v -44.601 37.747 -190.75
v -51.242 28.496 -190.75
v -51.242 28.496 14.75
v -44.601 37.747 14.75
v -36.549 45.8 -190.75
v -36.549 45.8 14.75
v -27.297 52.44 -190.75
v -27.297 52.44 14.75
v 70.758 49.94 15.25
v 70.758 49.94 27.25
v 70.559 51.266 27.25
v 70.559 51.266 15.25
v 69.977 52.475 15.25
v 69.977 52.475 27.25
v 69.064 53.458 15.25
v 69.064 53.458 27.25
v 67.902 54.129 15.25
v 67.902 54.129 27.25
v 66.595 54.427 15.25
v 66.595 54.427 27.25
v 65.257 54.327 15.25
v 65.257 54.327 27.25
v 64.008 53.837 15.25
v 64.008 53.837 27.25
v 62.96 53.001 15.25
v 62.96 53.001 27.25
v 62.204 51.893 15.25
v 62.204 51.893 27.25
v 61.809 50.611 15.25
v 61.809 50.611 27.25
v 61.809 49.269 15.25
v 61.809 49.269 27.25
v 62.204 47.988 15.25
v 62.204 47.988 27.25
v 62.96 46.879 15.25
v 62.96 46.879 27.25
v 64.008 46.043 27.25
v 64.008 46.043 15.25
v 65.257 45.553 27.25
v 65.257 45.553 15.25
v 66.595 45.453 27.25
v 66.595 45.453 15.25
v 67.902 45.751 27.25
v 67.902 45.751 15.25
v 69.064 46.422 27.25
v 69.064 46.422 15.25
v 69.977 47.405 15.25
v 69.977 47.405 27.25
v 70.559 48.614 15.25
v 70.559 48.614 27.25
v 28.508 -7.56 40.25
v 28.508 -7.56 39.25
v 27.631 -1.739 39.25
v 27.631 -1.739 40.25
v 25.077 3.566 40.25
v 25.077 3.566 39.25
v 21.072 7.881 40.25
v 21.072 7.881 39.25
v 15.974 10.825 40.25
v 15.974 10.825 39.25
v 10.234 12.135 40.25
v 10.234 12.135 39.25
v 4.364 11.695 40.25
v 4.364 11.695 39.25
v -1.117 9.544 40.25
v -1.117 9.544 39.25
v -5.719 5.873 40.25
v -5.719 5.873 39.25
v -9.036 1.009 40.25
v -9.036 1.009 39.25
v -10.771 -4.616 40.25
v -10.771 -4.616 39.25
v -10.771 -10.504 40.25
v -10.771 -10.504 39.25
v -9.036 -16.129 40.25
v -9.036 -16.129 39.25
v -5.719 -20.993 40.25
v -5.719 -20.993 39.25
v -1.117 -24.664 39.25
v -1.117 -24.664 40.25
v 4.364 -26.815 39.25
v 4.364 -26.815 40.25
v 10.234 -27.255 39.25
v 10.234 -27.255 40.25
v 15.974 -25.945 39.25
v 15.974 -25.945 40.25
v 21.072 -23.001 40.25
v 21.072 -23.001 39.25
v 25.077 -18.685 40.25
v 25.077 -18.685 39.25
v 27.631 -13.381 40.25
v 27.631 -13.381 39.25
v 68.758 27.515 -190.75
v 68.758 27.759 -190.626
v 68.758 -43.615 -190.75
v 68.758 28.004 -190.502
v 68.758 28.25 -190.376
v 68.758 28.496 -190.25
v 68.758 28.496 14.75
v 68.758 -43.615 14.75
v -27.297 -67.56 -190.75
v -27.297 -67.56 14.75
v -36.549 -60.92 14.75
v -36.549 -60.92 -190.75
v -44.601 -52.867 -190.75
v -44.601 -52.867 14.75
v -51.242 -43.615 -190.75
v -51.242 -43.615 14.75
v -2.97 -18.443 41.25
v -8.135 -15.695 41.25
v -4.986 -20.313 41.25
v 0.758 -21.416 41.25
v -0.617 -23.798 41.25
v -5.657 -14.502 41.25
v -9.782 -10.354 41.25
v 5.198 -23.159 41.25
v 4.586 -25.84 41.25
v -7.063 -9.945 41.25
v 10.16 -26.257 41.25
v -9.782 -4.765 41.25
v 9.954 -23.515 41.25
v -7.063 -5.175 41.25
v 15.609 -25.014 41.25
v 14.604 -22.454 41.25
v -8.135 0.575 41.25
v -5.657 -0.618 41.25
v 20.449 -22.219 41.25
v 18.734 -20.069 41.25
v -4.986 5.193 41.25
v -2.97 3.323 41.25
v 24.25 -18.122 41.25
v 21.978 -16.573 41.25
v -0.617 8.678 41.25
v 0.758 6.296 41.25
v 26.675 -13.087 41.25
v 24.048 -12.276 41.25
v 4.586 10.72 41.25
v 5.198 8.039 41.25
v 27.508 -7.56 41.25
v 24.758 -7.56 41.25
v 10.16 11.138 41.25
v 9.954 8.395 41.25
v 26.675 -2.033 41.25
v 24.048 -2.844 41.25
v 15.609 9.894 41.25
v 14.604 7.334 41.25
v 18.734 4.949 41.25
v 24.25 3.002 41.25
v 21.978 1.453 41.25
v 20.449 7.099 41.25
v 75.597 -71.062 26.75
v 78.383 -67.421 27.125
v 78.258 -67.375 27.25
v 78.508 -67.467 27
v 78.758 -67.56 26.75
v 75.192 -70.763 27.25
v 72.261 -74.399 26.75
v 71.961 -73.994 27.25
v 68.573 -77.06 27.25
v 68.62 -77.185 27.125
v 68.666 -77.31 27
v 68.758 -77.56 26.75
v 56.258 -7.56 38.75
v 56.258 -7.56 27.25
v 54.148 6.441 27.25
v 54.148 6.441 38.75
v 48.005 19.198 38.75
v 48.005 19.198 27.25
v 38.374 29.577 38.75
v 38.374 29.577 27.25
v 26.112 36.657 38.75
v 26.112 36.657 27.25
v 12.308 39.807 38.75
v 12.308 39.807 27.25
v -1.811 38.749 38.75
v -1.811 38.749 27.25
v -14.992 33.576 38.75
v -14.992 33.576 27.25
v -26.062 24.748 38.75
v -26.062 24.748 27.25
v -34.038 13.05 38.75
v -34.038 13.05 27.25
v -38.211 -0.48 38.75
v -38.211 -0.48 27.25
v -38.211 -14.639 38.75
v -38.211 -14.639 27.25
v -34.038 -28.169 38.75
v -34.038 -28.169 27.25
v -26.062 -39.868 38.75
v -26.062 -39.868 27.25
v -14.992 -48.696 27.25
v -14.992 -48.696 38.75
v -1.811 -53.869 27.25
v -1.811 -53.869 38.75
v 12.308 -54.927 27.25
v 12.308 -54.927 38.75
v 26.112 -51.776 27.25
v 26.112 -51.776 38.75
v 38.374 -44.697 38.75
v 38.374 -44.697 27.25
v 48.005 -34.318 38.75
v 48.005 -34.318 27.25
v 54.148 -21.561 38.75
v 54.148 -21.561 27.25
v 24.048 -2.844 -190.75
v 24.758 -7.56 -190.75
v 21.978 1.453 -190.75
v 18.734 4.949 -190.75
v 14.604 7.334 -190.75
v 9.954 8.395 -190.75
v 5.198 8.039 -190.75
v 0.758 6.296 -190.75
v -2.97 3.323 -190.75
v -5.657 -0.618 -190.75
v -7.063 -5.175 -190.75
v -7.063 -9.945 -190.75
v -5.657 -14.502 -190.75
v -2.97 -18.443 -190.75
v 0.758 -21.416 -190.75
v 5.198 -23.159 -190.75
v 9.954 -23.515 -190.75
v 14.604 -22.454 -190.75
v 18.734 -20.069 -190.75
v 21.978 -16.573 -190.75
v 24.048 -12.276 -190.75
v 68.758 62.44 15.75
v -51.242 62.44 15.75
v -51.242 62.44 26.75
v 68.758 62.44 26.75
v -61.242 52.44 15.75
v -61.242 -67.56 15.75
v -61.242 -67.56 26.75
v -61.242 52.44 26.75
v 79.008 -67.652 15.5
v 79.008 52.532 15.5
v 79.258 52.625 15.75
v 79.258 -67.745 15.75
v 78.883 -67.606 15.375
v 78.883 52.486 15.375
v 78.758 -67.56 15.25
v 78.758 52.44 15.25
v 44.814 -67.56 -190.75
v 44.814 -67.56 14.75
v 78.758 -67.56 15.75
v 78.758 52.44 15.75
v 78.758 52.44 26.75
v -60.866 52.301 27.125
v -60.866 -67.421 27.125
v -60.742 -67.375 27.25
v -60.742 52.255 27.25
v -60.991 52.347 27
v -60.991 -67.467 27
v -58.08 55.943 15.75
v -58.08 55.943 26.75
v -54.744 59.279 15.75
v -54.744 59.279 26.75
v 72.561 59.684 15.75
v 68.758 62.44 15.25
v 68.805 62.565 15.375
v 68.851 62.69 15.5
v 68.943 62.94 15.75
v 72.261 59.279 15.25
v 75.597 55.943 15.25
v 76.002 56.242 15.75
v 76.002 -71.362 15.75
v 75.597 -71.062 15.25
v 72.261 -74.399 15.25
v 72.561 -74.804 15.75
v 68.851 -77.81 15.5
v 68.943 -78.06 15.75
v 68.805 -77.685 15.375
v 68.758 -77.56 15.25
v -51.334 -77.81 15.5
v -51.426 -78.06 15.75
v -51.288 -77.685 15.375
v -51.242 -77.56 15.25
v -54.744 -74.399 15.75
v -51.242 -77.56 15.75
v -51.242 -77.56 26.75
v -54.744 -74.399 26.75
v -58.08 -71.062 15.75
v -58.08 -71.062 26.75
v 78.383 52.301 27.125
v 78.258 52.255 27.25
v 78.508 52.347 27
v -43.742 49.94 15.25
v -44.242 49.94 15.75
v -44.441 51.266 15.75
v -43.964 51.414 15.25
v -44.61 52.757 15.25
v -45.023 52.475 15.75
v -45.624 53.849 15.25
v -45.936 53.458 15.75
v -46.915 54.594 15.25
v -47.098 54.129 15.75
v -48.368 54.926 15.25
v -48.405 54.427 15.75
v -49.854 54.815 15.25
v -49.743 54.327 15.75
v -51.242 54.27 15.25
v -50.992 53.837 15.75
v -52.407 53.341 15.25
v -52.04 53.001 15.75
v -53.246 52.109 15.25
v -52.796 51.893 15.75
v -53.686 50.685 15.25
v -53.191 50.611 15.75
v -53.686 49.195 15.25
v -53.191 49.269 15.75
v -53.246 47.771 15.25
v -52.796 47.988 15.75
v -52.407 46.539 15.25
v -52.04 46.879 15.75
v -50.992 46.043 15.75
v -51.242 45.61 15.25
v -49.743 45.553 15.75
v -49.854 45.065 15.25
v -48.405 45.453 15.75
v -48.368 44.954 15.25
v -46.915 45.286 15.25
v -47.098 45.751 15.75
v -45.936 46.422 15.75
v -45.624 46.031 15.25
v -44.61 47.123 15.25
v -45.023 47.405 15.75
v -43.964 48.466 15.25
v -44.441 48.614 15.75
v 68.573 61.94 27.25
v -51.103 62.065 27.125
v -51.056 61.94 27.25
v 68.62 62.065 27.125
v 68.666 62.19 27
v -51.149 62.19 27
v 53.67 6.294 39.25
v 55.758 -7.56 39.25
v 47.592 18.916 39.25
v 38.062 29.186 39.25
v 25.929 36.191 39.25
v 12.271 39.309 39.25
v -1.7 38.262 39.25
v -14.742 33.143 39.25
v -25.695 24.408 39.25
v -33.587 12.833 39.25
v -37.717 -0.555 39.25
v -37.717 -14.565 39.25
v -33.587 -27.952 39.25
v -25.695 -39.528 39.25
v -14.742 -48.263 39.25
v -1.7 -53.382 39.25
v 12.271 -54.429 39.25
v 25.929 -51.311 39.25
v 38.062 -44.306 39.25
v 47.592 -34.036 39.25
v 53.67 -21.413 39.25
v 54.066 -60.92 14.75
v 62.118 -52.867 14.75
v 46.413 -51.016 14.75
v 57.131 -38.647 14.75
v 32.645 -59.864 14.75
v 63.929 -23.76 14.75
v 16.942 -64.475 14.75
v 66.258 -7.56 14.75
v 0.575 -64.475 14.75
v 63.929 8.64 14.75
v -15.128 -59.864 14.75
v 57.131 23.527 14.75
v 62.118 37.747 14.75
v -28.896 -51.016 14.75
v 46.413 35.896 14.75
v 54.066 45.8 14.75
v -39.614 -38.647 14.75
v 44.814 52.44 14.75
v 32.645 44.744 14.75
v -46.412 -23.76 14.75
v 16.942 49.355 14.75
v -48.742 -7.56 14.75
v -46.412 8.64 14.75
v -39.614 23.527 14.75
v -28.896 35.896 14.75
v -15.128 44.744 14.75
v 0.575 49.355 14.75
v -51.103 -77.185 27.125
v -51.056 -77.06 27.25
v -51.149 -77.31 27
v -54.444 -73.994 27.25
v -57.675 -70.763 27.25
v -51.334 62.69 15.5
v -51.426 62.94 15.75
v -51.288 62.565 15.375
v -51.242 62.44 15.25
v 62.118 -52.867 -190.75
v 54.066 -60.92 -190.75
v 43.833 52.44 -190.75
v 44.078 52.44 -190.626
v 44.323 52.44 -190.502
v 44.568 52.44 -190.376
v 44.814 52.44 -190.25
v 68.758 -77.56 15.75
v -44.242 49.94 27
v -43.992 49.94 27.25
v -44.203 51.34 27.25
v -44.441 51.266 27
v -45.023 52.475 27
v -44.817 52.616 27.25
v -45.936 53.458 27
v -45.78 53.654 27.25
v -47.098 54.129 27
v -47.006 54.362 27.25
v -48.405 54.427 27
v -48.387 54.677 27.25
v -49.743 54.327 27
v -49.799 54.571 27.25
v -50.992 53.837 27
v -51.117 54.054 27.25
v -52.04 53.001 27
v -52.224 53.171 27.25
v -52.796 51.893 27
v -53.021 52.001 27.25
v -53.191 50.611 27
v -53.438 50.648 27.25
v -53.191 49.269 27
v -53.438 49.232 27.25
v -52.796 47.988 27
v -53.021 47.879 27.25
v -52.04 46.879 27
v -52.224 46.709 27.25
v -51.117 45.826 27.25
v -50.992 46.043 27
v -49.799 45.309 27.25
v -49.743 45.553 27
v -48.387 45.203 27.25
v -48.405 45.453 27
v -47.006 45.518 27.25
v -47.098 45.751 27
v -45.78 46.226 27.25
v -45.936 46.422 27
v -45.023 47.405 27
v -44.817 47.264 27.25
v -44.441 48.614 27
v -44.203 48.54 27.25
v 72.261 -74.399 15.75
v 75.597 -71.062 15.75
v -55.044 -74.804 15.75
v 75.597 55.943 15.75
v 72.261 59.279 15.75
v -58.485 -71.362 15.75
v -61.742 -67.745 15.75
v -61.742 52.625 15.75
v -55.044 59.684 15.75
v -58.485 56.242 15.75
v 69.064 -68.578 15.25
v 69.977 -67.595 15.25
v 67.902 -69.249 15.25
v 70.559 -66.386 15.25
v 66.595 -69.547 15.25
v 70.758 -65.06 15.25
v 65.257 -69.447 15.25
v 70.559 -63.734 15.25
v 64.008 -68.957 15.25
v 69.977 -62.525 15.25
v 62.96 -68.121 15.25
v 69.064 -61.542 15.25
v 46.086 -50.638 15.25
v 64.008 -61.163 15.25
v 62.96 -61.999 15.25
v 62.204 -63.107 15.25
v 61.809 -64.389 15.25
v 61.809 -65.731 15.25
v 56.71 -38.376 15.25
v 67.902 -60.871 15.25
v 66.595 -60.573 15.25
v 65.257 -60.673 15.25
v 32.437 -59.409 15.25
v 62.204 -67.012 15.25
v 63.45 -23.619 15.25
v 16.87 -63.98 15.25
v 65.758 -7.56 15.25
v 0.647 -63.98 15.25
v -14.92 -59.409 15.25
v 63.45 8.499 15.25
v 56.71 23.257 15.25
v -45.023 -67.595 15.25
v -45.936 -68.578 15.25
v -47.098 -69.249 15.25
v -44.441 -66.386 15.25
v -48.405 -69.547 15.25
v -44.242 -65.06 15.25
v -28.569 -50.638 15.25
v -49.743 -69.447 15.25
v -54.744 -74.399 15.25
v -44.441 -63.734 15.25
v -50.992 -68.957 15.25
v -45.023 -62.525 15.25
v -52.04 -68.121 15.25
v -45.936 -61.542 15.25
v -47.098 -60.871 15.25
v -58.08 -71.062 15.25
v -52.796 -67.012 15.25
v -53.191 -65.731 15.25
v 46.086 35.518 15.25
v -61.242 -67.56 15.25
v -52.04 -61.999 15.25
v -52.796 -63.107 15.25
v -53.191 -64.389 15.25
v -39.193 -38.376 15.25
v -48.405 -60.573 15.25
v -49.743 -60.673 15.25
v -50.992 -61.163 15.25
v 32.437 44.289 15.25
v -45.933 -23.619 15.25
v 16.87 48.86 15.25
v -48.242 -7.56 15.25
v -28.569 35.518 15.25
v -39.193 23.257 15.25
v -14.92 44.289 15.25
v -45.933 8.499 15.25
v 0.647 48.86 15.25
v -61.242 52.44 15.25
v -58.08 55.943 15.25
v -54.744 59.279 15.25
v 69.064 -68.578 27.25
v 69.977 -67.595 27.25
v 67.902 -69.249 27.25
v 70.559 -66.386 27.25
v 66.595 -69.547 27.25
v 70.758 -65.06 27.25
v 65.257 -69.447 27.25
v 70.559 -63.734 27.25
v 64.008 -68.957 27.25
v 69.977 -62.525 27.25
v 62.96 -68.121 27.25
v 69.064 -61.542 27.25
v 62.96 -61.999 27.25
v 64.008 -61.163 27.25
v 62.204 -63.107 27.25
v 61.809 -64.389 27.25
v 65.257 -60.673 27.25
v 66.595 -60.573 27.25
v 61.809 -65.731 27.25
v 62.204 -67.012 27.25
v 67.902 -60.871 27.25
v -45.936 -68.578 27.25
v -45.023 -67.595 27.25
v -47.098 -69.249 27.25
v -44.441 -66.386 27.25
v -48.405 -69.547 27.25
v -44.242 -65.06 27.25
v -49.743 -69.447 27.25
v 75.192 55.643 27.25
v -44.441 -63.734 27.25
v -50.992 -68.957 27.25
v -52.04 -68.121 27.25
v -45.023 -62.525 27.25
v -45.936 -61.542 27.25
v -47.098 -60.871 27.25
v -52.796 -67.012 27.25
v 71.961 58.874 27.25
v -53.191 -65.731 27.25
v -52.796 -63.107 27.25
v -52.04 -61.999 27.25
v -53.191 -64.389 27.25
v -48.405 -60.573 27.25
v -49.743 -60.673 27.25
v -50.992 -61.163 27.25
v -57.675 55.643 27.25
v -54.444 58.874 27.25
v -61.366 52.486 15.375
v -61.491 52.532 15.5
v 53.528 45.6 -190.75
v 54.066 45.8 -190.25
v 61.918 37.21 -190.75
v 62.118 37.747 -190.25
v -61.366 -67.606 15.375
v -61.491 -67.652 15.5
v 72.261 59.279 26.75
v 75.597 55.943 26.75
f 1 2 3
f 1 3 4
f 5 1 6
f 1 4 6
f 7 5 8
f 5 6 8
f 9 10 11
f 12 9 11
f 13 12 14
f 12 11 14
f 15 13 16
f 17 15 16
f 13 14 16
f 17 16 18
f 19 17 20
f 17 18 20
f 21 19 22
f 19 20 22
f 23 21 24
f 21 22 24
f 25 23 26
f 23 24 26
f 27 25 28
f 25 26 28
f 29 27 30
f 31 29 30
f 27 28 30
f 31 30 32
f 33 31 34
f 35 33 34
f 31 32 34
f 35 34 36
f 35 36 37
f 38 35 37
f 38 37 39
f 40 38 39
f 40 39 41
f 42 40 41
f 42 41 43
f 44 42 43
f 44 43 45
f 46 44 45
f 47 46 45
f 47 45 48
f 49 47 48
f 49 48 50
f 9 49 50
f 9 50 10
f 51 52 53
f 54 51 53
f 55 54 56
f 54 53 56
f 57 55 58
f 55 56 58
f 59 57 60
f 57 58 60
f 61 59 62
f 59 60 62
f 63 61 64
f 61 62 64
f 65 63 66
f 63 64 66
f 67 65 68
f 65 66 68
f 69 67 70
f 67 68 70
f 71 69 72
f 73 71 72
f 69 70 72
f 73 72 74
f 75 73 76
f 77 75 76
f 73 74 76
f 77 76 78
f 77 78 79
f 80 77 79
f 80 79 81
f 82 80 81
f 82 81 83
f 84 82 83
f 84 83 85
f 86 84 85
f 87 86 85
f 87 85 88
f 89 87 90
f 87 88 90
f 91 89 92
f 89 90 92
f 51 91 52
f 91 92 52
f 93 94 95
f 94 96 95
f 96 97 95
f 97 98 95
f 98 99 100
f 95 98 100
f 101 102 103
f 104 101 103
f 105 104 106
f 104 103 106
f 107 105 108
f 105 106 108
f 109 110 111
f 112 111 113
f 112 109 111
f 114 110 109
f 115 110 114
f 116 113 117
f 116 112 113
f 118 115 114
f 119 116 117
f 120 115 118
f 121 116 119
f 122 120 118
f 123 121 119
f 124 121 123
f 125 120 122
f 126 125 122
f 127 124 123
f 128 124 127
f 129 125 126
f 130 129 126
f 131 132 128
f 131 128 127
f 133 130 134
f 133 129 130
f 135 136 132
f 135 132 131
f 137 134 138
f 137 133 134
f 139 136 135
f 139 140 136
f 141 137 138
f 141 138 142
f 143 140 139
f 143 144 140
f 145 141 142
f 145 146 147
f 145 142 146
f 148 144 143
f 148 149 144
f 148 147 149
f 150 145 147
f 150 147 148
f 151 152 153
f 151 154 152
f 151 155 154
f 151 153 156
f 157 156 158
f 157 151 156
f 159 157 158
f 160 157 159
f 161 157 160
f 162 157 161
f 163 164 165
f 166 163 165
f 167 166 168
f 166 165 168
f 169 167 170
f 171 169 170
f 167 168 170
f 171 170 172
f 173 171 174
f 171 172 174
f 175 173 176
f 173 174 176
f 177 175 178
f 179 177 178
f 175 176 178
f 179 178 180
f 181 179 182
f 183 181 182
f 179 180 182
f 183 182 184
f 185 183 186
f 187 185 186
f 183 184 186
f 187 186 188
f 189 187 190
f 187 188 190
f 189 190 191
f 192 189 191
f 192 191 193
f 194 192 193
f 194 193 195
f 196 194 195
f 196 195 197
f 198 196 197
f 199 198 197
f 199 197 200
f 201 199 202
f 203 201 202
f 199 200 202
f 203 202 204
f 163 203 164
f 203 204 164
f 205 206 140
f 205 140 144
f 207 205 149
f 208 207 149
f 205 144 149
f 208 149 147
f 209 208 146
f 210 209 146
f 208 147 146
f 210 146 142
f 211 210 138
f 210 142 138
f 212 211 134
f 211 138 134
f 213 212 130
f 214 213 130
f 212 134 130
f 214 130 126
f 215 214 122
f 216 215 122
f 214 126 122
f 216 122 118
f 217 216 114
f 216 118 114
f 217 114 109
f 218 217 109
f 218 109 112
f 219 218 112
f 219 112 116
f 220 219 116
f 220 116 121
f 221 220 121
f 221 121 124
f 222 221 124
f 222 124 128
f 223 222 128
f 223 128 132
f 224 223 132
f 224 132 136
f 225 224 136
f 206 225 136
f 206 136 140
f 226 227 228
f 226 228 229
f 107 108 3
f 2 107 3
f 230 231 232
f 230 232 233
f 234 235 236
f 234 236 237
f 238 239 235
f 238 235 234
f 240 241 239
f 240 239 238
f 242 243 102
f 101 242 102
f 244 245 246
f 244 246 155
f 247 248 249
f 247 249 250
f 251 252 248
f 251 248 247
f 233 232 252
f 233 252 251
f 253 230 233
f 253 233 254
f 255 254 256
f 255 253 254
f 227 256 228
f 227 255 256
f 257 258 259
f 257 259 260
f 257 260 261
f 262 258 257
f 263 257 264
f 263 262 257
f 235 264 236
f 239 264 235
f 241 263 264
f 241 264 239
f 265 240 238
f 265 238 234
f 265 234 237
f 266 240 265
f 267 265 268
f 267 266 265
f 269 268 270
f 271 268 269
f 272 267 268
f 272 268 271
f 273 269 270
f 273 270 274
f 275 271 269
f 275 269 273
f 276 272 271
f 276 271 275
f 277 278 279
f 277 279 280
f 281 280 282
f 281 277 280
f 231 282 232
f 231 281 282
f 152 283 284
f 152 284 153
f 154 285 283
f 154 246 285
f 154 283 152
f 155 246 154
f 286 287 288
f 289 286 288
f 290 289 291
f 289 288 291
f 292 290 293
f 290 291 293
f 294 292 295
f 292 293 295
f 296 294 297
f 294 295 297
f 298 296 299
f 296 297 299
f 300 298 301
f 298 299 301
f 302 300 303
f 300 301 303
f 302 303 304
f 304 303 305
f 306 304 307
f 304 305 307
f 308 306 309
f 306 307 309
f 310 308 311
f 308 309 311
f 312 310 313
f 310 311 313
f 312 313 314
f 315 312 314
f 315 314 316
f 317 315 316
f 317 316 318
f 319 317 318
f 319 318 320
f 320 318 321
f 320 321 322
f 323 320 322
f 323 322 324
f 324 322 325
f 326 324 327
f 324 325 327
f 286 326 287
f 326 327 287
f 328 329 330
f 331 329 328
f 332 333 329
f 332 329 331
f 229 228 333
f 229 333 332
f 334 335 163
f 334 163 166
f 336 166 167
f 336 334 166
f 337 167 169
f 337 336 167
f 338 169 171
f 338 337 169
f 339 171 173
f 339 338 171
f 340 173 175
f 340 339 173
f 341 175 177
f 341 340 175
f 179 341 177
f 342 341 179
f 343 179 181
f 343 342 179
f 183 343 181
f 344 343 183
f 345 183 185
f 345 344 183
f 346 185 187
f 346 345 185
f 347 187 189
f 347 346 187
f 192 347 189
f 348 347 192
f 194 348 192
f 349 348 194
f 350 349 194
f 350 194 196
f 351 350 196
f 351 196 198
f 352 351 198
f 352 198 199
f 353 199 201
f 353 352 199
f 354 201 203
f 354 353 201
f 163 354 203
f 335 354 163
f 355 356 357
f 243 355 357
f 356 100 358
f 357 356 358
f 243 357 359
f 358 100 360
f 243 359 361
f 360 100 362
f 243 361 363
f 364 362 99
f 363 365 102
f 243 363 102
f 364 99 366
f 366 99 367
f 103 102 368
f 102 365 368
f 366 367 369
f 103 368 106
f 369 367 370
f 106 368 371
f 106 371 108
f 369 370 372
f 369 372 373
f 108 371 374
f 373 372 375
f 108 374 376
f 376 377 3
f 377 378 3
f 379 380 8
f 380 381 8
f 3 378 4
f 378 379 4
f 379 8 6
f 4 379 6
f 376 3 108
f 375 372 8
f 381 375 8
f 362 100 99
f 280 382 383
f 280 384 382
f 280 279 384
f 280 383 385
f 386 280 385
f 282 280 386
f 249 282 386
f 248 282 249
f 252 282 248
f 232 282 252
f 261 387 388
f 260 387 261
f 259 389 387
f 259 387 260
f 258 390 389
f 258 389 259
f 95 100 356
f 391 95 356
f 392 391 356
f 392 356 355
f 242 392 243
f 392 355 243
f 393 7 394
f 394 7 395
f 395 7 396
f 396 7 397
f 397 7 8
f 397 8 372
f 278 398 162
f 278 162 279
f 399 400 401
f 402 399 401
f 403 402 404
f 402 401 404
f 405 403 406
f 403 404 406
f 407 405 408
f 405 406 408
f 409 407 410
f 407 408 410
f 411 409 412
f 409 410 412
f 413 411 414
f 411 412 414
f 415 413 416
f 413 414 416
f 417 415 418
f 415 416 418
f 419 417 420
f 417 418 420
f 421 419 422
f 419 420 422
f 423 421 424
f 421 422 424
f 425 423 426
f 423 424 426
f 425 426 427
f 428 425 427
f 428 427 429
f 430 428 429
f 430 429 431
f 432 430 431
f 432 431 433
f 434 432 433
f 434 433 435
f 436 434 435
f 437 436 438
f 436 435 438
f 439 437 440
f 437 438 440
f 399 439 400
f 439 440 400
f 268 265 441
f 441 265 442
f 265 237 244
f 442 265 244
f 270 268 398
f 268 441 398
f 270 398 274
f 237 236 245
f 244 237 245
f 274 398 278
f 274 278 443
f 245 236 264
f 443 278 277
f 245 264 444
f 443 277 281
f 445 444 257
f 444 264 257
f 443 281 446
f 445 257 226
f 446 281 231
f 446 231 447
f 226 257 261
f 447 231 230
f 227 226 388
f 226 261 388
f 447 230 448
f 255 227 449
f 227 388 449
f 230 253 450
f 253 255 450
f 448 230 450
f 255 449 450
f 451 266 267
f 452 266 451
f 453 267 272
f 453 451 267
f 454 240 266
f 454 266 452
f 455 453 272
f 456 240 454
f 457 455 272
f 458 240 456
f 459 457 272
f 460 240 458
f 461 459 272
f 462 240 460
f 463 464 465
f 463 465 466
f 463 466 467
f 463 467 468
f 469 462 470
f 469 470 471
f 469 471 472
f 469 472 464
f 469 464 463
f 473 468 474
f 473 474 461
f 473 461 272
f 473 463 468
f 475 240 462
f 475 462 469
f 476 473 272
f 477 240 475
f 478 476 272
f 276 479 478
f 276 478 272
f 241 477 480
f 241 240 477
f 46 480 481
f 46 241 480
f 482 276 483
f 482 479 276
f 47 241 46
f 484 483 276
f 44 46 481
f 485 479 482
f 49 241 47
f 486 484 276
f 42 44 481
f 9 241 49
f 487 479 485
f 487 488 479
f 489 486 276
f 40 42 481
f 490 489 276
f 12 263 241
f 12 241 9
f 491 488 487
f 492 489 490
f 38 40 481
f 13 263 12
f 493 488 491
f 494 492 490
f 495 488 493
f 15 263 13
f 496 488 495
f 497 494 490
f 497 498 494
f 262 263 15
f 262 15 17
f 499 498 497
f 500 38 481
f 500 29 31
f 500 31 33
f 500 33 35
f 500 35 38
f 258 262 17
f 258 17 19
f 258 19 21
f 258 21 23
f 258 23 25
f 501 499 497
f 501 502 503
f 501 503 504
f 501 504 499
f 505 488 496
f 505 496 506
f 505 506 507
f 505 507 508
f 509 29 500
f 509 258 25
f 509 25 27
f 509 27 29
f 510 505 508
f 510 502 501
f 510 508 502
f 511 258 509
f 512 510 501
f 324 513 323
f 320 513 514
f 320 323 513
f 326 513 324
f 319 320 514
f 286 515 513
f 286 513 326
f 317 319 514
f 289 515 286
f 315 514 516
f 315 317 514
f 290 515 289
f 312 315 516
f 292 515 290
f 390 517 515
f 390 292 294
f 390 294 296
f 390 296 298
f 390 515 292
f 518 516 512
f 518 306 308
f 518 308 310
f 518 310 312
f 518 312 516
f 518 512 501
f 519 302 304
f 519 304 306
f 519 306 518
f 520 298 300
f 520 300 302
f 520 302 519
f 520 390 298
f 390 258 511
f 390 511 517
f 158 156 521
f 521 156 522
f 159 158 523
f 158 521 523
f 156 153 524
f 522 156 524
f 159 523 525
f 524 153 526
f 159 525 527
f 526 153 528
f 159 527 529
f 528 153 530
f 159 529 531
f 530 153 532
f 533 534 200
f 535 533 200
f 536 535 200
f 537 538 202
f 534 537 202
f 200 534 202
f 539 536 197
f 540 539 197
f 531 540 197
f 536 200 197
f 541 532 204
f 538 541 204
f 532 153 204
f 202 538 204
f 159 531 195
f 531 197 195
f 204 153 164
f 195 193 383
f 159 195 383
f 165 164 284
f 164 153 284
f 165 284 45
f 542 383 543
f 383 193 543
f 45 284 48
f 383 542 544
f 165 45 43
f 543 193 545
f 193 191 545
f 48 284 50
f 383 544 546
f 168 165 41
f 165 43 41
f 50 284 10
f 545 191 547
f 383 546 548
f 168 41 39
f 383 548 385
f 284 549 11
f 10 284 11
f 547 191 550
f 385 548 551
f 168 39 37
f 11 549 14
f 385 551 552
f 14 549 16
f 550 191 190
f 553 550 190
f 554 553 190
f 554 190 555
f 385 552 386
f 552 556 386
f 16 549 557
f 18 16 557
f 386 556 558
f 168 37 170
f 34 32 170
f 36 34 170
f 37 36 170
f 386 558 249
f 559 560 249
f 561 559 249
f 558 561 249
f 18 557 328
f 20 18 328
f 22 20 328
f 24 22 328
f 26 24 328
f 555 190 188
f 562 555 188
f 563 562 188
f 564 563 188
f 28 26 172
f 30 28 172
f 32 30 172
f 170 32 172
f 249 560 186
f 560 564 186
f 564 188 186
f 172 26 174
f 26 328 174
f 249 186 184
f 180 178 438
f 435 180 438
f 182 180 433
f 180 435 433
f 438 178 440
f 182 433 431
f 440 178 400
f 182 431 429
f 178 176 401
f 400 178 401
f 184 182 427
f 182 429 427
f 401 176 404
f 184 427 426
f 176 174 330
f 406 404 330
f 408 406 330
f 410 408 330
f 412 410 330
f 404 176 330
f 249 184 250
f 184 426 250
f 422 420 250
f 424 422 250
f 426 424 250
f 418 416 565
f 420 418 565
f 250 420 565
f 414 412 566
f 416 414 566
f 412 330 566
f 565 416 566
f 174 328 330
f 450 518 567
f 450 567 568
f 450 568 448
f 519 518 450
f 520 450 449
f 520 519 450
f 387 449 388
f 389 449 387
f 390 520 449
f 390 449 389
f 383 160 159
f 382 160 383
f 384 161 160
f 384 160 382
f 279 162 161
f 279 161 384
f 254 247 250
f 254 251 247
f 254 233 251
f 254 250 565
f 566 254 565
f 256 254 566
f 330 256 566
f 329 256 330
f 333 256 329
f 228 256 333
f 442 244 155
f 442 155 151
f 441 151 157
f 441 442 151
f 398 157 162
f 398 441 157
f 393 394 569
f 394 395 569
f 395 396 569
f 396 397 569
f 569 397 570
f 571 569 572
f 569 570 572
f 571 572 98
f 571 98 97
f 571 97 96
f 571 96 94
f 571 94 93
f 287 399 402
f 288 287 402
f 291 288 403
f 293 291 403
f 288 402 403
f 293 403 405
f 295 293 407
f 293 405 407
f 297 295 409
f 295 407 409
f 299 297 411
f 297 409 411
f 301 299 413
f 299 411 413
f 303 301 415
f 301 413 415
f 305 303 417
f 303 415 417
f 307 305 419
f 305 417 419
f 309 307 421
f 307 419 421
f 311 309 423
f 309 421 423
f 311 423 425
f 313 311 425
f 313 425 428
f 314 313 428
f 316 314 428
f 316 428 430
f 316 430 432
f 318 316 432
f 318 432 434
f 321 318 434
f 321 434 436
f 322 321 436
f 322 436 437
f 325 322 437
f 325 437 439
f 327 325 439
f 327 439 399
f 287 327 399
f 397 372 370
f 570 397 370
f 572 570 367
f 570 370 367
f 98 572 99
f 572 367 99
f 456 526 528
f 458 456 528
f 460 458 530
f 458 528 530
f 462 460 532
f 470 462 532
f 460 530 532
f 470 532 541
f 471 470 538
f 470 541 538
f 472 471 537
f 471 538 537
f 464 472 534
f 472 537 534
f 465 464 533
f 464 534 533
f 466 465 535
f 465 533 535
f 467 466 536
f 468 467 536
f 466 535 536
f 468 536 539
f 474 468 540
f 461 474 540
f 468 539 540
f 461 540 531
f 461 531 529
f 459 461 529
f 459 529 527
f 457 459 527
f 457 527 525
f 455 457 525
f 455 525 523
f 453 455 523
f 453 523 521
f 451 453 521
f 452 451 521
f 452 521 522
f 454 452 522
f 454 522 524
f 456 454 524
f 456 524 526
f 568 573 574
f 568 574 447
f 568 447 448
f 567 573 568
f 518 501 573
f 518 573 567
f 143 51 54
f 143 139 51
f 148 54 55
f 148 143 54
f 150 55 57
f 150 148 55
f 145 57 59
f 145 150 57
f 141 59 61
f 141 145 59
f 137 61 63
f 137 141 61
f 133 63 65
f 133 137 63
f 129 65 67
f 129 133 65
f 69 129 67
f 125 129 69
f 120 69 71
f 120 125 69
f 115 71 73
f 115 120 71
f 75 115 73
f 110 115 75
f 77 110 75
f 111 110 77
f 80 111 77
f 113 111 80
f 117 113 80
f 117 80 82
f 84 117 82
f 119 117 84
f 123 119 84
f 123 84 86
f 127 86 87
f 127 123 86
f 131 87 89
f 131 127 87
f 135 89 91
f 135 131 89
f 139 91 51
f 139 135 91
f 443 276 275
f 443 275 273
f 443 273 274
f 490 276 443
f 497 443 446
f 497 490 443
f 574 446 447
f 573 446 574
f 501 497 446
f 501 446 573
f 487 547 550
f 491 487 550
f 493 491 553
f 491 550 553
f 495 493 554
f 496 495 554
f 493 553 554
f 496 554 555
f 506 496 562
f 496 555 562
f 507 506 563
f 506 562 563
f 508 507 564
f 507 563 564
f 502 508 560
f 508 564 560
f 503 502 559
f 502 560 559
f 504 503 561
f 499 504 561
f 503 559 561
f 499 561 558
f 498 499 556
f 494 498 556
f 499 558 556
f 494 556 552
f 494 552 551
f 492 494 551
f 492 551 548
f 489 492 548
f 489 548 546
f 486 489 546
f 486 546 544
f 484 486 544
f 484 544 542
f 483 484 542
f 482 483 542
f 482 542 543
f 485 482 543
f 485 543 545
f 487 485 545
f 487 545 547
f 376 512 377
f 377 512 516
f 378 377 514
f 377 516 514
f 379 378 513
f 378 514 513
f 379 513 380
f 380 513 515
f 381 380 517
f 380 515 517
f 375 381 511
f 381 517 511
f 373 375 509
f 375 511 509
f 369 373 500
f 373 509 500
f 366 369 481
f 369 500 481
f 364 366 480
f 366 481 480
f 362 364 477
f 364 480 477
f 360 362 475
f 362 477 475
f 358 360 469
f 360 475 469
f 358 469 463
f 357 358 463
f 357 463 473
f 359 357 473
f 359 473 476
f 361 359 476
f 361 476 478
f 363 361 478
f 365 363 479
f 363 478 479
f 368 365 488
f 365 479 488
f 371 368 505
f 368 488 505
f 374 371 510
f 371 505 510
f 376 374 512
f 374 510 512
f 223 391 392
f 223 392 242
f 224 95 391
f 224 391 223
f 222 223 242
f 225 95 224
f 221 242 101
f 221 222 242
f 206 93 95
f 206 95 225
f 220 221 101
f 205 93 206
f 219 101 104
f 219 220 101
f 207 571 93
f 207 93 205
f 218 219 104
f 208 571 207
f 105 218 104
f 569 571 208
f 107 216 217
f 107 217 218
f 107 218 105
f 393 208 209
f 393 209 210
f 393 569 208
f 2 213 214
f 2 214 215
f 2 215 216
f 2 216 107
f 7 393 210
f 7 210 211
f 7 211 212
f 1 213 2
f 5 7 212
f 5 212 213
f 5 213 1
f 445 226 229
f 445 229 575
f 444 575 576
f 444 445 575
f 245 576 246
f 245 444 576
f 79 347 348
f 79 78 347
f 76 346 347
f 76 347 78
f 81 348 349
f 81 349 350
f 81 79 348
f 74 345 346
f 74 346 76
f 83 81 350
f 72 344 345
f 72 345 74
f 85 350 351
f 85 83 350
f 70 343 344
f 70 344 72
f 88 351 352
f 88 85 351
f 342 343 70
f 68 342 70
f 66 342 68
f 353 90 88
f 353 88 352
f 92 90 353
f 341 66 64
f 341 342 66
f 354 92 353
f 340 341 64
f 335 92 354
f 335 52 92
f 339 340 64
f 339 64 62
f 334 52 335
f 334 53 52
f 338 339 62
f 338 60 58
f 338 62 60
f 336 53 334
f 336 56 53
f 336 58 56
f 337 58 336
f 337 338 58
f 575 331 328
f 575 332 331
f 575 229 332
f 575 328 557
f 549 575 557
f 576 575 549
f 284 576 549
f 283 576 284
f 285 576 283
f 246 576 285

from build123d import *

# Parameters (mm, degrees)
BOSS_EXTRUDE10_DEPTH     = 0.5
BOSS_EXTRUDE10_DRAFT     = 45
BOSS_EXTRUDE11_DEPTH     = 11.499997616
SKETCH19_R               = 47.5
BOSS_EXTRUDE12_DEPTH     = 12.000000954
SKETCH20_R               = 19.75
BOSS_EXTRUDE13_DEPTH     = 1
SKETCH21_R               = 19.75
BOSS_EXTRUDE14_DEPTH     = 1
BOSS_EXTRUDE14_TAPER     = 45
SKETCH22_R               = 16
BOSS_EXTRUDE15_DEPTH     = 50
SKETCH28_R               = 57
BOSS_EXTRUDE17_DEPTH     = 0.5
BOSS_EXTRUDE17_DRAFT     = -45
BOSS_EXTRUDE18_DEPTH     = 205.500001907
F_9_0_9_DIAMETER_HOLE2_D = 9
CHAMFER5_SIZE            = 0.5
CHAMFER6_SIZE            = 0.25
SKETCH32_R               = 16
CUT_EXTRUDE1_DEPTH       = 311.604659233


with BuildPart() as part:
    # Sketch17 → Boss-Extrude10 (with draft: the straight prism first)
    with BuildSketch(Plane(origin=(0, 0, 15.249999762), x_dir=(-1, 0, 0), z_dir=(0, 0, -1))):
        with BuildLine():
            Line((-68.758451007, -77.559925727), (51.241548993, -77.559925727))
            ThreePointArc((51.241548993, -77.559925727), (56.433573045, -72.751949779), (61.241548993, -67.559925727))
            Line((61.241548993, -67.559925727), (61.241548993, 52.440074273))
            ThreePointArc((61.241548993, 52.440074273), (56.433573045, 57.632098325), (51.241548993, 62.440074273))
            Line((51.241548993, 62.440074273), (-68.758451007, 62.440074273))
            ThreePointArc((-68.758451007, 62.440074273), (-73.950475059, 57.632098325), (-78.758451007, 52.440074273))
            Line((-78.758451007, 52.440074273), (-78.758451007, -67.559925727))
            ThreePointArc((-78.758451007, -67.559925727), (-73.950475059, -72.751949779), (-68.758451007, -77.559925727))
        make_face()
    extrude(amount=-BOSS_EXTRUDE10_DEPTH)
    # Boss-Extrude10: the draft: its side faces are tilted about the plane it starts from
    boss_extrude10_sides = [part.faces().sort_by_distance(p)[0] for p in [
        (8.758451007, -77.559925727, 15.499999762),
        (-56.433573045, -72.751949779, 15.499999762),
        (-61.241548993, -7.559925727, 15.499999762),
        (-56.433573045, 57.632098325, 15.499999762),
        (8.758451007, 62.440074273, 15.499999762),
        (73.950475059, 57.632098325, 15.499999762),
        (78.758451007, -7.559925727, 15.499999762),
        (73.950475059, -72.751949779, 15.499999762),
    ]]
    draft(boss_extrude10_sides, Plane(origin=(0, 0, 15.249999762), x_dir=(-1, 0, 0), z_dir=(0, 0, -1)), BOSS_EXTRUDE10_DRAFT)

    # Sketch18 → Boss-Extrude11 (add)
    with BuildSketch(Plane.XY.offset(15.749999762)):
        with BuildLine():
            Line((-51.241548993, 62.440074273), (68.758451007, 62.440074273))
            ThreePointArc((68.758451007, 62.440074273), (73.950475059, 57.632098325), (78.758451007, 52.440074273))
            Line((78.758451007, 52.440074273), (78.758451007, -67.559925727))
            ThreePointArc((78.758451007, -67.559925727), (73.950475059, -72.751949779), (68.758451007, -77.559925727))
            Line((68.758451007, -77.559925727), (-51.241548993, -77.559925727))
            ThreePointArc((-51.241548993, -77.559925727), (-56.433573045, -72.751949779), (-61.241548993, -67.559925727))
            Line((-61.241548993, -67.559925727), (-61.241548993, 52.440074273))
            ThreePointArc((-61.241548993, 52.440074273), (-56.433573045, 57.632098325), (-51.241548993, 62.440074273))
        make_face()
    extrude(amount=BOSS_EXTRUDE11_DEPTH)

    # Sketch19 → Boss-Extrude12 (add)
    with BuildSketch(Plane.XY.offset(27.249997377)):
        with Locations((8.758451007, -7.559925727)):
            Circle(SKETCH19_R)
    extrude(amount=BOSS_EXTRUDE12_DEPTH)

    # Sketch20 → Boss-Extrude13 (add)
    with BuildSketch(Plane.XY.offset(39.249998331)):
        with Locations((8.758451007, -7.559925727)):
            Circle(SKETCH20_R)
    extrude(amount=BOSS_EXTRUDE13_DEPTH)

    # Sketch21 → Boss-Extrude14 (add)
    with BuildSketch(Plane.XY.offset(40.249998331)):
        with Locations((8.758451007, -7.559925727)):
            Circle(SKETCH21_R)
    extrude(amount=BOSS_EXTRUDE14_DEPTH, taper=BOSS_EXTRUDE14_TAPER)

    # Sketch22 → Boss-Extrude15 (add)
    with BuildSketch(Plane.XY.offset(41.249998331)):
        with Locations((8.758451007, -7.559925727)):
            Circle(SKETCH22_R)
    extrude(amount=BOSS_EXTRUDE15_DEPTH)


with BuildPart() as boss_extrude17_tool:
    # Sketch28 → Boss-Extrude17 (with draft: the straight prism first)
    with BuildSketch(Plane(origin=(0, 0, 15.249999762), x_dir=(-1, 0, 0), z_dir=(0, 0, -1))):
        with Locations((-8.758451007, -7.559925727)):
            Circle(SKETCH28_R)
    extrude(amount=BOSS_EXTRUDE17_DEPTH)
    # Boss-Extrude17: the draft: its side faces are tilted about the plane it starts from
    boss_extrude17_sides = [boss_extrude17_tool.faces().sort_by_distance(p)[0] for p in [
        (65.758451007, -7.559925727, 14.999999762),
    ]]
    draft(boss_extrude17_sides, Plane(origin=(0, 0, 15.249999762), x_dir=(-1, 0, 0), z_dir=(0, 0, -1)), BOSS_EXTRUDE17_DRAFT)


with BuildPart() as part_1:
    add(part.part)

    # Boss-Extrude17: add boss_extrude17_tool
    add(boss_extrude17_tool.part)

    # Sketch29 → Boss-Extrude18 (add)
    with BuildSketch(Plane(origin=(0, 0, 14.749999762), x_dir=(-1, 0, 0), z_dir=(0, 0, -1))):
        with BuildLine():
            Line((-44.813963761, -67.559925727), (27.297061748, -67.559925727))
            ThreePointArc((27.297061748, -67.559925727), (40.739023677, -57.05740041), (51.241548993, -43.615438482))
            Line((51.241548993, -43.615438482), (51.241548993, 28.495587027))
            ThreePointArc((51.241548993, 28.495587027), (40.739023677, 41.937548956), (27.297061748, 52.440074273))
            Line((27.297061748, 52.440074273), (-44.813963761, 52.440074273))
            ThreePointArc((-44.813963761, 52.440074273), (-58.25592569, 41.937548956), (-68.758451007, 28.495587027))
            Line((-68.758451007, 28.495587027), (-68.758451007, -43.615438482))
            ThreePointArc((-68.758451007, -43.615438482), (-58.25592569, -57.05740041), (-44.813963761, -67.559925727))
        make_face()
    extrude(amount=BOSS_EXTRUDE18_DEPTH)

    # Ø9.0 (9) Diameter Hole2 (through all)
    with Locations(Plane(origin=(0, 0, 15.249999762), x_dir=(-1, 0, 0), z_dir=(0, 0, -1))):
        with Locations((48.741548993, 49.940074273), (-66.258451007, 49.940074273), (-66.258451007, -65.059925727), (48.741548993, -65.059925727)):
            Hole(F_9_0_9_DIAMETER_HOLE2_D / 2)

    # Chamfer5
    chamfer5_edges = [part_1.edges().sort_by_distance(p)[0] for p in [
        (-53.241548993, 49.940074273, 15.249999762),
        (-56.433573045, 57.632098325, 27.249997377),
        (-61.241548993, -7.559925727, 27.249997377),
        (-56.433573045, -72.751949779, 27.249997377),
        (8.758451007, -77.559925727, 27.249997377),
        (73.950475059, -72.751949779, 27.249997377),
        (78.758451007, -7.559925727, 27.249997377),
        (73.950475059, 57.632098325, 27.249997377),
        (8.758451007, 62.440074273, 27.249997377),
        (-38.741548993, -7.559925727, 39.249998331),
        (58.25592569, 41.937548956, -190.750002146),
    ]]
    chamfer(chamfer5_edges, length=CHAMFER5_SIZE)

    # Chamfer6
    chamfer6_edges = [part_1.edges().sort_by_distance(p)[0] for p in [
        (-53.241548993, 49.940074273, 27.249997377),
    ]]
    chamfer(chamfer6_edges, length=CHAMFER6_SIZE)

    # Sketch32 → Cut-Extrude1 (cut, through all)
    with BuildSketch(Plane.XY.offset(99.249998331)):
        with Locations((8.758451007, -7.559925727)):
            Circle(SKETCH32_R)
    extrude(amount=-CUT_EXTRUDE1_DEPTH, mode=Mode.SUBTRACT)


solid = part_1.part
